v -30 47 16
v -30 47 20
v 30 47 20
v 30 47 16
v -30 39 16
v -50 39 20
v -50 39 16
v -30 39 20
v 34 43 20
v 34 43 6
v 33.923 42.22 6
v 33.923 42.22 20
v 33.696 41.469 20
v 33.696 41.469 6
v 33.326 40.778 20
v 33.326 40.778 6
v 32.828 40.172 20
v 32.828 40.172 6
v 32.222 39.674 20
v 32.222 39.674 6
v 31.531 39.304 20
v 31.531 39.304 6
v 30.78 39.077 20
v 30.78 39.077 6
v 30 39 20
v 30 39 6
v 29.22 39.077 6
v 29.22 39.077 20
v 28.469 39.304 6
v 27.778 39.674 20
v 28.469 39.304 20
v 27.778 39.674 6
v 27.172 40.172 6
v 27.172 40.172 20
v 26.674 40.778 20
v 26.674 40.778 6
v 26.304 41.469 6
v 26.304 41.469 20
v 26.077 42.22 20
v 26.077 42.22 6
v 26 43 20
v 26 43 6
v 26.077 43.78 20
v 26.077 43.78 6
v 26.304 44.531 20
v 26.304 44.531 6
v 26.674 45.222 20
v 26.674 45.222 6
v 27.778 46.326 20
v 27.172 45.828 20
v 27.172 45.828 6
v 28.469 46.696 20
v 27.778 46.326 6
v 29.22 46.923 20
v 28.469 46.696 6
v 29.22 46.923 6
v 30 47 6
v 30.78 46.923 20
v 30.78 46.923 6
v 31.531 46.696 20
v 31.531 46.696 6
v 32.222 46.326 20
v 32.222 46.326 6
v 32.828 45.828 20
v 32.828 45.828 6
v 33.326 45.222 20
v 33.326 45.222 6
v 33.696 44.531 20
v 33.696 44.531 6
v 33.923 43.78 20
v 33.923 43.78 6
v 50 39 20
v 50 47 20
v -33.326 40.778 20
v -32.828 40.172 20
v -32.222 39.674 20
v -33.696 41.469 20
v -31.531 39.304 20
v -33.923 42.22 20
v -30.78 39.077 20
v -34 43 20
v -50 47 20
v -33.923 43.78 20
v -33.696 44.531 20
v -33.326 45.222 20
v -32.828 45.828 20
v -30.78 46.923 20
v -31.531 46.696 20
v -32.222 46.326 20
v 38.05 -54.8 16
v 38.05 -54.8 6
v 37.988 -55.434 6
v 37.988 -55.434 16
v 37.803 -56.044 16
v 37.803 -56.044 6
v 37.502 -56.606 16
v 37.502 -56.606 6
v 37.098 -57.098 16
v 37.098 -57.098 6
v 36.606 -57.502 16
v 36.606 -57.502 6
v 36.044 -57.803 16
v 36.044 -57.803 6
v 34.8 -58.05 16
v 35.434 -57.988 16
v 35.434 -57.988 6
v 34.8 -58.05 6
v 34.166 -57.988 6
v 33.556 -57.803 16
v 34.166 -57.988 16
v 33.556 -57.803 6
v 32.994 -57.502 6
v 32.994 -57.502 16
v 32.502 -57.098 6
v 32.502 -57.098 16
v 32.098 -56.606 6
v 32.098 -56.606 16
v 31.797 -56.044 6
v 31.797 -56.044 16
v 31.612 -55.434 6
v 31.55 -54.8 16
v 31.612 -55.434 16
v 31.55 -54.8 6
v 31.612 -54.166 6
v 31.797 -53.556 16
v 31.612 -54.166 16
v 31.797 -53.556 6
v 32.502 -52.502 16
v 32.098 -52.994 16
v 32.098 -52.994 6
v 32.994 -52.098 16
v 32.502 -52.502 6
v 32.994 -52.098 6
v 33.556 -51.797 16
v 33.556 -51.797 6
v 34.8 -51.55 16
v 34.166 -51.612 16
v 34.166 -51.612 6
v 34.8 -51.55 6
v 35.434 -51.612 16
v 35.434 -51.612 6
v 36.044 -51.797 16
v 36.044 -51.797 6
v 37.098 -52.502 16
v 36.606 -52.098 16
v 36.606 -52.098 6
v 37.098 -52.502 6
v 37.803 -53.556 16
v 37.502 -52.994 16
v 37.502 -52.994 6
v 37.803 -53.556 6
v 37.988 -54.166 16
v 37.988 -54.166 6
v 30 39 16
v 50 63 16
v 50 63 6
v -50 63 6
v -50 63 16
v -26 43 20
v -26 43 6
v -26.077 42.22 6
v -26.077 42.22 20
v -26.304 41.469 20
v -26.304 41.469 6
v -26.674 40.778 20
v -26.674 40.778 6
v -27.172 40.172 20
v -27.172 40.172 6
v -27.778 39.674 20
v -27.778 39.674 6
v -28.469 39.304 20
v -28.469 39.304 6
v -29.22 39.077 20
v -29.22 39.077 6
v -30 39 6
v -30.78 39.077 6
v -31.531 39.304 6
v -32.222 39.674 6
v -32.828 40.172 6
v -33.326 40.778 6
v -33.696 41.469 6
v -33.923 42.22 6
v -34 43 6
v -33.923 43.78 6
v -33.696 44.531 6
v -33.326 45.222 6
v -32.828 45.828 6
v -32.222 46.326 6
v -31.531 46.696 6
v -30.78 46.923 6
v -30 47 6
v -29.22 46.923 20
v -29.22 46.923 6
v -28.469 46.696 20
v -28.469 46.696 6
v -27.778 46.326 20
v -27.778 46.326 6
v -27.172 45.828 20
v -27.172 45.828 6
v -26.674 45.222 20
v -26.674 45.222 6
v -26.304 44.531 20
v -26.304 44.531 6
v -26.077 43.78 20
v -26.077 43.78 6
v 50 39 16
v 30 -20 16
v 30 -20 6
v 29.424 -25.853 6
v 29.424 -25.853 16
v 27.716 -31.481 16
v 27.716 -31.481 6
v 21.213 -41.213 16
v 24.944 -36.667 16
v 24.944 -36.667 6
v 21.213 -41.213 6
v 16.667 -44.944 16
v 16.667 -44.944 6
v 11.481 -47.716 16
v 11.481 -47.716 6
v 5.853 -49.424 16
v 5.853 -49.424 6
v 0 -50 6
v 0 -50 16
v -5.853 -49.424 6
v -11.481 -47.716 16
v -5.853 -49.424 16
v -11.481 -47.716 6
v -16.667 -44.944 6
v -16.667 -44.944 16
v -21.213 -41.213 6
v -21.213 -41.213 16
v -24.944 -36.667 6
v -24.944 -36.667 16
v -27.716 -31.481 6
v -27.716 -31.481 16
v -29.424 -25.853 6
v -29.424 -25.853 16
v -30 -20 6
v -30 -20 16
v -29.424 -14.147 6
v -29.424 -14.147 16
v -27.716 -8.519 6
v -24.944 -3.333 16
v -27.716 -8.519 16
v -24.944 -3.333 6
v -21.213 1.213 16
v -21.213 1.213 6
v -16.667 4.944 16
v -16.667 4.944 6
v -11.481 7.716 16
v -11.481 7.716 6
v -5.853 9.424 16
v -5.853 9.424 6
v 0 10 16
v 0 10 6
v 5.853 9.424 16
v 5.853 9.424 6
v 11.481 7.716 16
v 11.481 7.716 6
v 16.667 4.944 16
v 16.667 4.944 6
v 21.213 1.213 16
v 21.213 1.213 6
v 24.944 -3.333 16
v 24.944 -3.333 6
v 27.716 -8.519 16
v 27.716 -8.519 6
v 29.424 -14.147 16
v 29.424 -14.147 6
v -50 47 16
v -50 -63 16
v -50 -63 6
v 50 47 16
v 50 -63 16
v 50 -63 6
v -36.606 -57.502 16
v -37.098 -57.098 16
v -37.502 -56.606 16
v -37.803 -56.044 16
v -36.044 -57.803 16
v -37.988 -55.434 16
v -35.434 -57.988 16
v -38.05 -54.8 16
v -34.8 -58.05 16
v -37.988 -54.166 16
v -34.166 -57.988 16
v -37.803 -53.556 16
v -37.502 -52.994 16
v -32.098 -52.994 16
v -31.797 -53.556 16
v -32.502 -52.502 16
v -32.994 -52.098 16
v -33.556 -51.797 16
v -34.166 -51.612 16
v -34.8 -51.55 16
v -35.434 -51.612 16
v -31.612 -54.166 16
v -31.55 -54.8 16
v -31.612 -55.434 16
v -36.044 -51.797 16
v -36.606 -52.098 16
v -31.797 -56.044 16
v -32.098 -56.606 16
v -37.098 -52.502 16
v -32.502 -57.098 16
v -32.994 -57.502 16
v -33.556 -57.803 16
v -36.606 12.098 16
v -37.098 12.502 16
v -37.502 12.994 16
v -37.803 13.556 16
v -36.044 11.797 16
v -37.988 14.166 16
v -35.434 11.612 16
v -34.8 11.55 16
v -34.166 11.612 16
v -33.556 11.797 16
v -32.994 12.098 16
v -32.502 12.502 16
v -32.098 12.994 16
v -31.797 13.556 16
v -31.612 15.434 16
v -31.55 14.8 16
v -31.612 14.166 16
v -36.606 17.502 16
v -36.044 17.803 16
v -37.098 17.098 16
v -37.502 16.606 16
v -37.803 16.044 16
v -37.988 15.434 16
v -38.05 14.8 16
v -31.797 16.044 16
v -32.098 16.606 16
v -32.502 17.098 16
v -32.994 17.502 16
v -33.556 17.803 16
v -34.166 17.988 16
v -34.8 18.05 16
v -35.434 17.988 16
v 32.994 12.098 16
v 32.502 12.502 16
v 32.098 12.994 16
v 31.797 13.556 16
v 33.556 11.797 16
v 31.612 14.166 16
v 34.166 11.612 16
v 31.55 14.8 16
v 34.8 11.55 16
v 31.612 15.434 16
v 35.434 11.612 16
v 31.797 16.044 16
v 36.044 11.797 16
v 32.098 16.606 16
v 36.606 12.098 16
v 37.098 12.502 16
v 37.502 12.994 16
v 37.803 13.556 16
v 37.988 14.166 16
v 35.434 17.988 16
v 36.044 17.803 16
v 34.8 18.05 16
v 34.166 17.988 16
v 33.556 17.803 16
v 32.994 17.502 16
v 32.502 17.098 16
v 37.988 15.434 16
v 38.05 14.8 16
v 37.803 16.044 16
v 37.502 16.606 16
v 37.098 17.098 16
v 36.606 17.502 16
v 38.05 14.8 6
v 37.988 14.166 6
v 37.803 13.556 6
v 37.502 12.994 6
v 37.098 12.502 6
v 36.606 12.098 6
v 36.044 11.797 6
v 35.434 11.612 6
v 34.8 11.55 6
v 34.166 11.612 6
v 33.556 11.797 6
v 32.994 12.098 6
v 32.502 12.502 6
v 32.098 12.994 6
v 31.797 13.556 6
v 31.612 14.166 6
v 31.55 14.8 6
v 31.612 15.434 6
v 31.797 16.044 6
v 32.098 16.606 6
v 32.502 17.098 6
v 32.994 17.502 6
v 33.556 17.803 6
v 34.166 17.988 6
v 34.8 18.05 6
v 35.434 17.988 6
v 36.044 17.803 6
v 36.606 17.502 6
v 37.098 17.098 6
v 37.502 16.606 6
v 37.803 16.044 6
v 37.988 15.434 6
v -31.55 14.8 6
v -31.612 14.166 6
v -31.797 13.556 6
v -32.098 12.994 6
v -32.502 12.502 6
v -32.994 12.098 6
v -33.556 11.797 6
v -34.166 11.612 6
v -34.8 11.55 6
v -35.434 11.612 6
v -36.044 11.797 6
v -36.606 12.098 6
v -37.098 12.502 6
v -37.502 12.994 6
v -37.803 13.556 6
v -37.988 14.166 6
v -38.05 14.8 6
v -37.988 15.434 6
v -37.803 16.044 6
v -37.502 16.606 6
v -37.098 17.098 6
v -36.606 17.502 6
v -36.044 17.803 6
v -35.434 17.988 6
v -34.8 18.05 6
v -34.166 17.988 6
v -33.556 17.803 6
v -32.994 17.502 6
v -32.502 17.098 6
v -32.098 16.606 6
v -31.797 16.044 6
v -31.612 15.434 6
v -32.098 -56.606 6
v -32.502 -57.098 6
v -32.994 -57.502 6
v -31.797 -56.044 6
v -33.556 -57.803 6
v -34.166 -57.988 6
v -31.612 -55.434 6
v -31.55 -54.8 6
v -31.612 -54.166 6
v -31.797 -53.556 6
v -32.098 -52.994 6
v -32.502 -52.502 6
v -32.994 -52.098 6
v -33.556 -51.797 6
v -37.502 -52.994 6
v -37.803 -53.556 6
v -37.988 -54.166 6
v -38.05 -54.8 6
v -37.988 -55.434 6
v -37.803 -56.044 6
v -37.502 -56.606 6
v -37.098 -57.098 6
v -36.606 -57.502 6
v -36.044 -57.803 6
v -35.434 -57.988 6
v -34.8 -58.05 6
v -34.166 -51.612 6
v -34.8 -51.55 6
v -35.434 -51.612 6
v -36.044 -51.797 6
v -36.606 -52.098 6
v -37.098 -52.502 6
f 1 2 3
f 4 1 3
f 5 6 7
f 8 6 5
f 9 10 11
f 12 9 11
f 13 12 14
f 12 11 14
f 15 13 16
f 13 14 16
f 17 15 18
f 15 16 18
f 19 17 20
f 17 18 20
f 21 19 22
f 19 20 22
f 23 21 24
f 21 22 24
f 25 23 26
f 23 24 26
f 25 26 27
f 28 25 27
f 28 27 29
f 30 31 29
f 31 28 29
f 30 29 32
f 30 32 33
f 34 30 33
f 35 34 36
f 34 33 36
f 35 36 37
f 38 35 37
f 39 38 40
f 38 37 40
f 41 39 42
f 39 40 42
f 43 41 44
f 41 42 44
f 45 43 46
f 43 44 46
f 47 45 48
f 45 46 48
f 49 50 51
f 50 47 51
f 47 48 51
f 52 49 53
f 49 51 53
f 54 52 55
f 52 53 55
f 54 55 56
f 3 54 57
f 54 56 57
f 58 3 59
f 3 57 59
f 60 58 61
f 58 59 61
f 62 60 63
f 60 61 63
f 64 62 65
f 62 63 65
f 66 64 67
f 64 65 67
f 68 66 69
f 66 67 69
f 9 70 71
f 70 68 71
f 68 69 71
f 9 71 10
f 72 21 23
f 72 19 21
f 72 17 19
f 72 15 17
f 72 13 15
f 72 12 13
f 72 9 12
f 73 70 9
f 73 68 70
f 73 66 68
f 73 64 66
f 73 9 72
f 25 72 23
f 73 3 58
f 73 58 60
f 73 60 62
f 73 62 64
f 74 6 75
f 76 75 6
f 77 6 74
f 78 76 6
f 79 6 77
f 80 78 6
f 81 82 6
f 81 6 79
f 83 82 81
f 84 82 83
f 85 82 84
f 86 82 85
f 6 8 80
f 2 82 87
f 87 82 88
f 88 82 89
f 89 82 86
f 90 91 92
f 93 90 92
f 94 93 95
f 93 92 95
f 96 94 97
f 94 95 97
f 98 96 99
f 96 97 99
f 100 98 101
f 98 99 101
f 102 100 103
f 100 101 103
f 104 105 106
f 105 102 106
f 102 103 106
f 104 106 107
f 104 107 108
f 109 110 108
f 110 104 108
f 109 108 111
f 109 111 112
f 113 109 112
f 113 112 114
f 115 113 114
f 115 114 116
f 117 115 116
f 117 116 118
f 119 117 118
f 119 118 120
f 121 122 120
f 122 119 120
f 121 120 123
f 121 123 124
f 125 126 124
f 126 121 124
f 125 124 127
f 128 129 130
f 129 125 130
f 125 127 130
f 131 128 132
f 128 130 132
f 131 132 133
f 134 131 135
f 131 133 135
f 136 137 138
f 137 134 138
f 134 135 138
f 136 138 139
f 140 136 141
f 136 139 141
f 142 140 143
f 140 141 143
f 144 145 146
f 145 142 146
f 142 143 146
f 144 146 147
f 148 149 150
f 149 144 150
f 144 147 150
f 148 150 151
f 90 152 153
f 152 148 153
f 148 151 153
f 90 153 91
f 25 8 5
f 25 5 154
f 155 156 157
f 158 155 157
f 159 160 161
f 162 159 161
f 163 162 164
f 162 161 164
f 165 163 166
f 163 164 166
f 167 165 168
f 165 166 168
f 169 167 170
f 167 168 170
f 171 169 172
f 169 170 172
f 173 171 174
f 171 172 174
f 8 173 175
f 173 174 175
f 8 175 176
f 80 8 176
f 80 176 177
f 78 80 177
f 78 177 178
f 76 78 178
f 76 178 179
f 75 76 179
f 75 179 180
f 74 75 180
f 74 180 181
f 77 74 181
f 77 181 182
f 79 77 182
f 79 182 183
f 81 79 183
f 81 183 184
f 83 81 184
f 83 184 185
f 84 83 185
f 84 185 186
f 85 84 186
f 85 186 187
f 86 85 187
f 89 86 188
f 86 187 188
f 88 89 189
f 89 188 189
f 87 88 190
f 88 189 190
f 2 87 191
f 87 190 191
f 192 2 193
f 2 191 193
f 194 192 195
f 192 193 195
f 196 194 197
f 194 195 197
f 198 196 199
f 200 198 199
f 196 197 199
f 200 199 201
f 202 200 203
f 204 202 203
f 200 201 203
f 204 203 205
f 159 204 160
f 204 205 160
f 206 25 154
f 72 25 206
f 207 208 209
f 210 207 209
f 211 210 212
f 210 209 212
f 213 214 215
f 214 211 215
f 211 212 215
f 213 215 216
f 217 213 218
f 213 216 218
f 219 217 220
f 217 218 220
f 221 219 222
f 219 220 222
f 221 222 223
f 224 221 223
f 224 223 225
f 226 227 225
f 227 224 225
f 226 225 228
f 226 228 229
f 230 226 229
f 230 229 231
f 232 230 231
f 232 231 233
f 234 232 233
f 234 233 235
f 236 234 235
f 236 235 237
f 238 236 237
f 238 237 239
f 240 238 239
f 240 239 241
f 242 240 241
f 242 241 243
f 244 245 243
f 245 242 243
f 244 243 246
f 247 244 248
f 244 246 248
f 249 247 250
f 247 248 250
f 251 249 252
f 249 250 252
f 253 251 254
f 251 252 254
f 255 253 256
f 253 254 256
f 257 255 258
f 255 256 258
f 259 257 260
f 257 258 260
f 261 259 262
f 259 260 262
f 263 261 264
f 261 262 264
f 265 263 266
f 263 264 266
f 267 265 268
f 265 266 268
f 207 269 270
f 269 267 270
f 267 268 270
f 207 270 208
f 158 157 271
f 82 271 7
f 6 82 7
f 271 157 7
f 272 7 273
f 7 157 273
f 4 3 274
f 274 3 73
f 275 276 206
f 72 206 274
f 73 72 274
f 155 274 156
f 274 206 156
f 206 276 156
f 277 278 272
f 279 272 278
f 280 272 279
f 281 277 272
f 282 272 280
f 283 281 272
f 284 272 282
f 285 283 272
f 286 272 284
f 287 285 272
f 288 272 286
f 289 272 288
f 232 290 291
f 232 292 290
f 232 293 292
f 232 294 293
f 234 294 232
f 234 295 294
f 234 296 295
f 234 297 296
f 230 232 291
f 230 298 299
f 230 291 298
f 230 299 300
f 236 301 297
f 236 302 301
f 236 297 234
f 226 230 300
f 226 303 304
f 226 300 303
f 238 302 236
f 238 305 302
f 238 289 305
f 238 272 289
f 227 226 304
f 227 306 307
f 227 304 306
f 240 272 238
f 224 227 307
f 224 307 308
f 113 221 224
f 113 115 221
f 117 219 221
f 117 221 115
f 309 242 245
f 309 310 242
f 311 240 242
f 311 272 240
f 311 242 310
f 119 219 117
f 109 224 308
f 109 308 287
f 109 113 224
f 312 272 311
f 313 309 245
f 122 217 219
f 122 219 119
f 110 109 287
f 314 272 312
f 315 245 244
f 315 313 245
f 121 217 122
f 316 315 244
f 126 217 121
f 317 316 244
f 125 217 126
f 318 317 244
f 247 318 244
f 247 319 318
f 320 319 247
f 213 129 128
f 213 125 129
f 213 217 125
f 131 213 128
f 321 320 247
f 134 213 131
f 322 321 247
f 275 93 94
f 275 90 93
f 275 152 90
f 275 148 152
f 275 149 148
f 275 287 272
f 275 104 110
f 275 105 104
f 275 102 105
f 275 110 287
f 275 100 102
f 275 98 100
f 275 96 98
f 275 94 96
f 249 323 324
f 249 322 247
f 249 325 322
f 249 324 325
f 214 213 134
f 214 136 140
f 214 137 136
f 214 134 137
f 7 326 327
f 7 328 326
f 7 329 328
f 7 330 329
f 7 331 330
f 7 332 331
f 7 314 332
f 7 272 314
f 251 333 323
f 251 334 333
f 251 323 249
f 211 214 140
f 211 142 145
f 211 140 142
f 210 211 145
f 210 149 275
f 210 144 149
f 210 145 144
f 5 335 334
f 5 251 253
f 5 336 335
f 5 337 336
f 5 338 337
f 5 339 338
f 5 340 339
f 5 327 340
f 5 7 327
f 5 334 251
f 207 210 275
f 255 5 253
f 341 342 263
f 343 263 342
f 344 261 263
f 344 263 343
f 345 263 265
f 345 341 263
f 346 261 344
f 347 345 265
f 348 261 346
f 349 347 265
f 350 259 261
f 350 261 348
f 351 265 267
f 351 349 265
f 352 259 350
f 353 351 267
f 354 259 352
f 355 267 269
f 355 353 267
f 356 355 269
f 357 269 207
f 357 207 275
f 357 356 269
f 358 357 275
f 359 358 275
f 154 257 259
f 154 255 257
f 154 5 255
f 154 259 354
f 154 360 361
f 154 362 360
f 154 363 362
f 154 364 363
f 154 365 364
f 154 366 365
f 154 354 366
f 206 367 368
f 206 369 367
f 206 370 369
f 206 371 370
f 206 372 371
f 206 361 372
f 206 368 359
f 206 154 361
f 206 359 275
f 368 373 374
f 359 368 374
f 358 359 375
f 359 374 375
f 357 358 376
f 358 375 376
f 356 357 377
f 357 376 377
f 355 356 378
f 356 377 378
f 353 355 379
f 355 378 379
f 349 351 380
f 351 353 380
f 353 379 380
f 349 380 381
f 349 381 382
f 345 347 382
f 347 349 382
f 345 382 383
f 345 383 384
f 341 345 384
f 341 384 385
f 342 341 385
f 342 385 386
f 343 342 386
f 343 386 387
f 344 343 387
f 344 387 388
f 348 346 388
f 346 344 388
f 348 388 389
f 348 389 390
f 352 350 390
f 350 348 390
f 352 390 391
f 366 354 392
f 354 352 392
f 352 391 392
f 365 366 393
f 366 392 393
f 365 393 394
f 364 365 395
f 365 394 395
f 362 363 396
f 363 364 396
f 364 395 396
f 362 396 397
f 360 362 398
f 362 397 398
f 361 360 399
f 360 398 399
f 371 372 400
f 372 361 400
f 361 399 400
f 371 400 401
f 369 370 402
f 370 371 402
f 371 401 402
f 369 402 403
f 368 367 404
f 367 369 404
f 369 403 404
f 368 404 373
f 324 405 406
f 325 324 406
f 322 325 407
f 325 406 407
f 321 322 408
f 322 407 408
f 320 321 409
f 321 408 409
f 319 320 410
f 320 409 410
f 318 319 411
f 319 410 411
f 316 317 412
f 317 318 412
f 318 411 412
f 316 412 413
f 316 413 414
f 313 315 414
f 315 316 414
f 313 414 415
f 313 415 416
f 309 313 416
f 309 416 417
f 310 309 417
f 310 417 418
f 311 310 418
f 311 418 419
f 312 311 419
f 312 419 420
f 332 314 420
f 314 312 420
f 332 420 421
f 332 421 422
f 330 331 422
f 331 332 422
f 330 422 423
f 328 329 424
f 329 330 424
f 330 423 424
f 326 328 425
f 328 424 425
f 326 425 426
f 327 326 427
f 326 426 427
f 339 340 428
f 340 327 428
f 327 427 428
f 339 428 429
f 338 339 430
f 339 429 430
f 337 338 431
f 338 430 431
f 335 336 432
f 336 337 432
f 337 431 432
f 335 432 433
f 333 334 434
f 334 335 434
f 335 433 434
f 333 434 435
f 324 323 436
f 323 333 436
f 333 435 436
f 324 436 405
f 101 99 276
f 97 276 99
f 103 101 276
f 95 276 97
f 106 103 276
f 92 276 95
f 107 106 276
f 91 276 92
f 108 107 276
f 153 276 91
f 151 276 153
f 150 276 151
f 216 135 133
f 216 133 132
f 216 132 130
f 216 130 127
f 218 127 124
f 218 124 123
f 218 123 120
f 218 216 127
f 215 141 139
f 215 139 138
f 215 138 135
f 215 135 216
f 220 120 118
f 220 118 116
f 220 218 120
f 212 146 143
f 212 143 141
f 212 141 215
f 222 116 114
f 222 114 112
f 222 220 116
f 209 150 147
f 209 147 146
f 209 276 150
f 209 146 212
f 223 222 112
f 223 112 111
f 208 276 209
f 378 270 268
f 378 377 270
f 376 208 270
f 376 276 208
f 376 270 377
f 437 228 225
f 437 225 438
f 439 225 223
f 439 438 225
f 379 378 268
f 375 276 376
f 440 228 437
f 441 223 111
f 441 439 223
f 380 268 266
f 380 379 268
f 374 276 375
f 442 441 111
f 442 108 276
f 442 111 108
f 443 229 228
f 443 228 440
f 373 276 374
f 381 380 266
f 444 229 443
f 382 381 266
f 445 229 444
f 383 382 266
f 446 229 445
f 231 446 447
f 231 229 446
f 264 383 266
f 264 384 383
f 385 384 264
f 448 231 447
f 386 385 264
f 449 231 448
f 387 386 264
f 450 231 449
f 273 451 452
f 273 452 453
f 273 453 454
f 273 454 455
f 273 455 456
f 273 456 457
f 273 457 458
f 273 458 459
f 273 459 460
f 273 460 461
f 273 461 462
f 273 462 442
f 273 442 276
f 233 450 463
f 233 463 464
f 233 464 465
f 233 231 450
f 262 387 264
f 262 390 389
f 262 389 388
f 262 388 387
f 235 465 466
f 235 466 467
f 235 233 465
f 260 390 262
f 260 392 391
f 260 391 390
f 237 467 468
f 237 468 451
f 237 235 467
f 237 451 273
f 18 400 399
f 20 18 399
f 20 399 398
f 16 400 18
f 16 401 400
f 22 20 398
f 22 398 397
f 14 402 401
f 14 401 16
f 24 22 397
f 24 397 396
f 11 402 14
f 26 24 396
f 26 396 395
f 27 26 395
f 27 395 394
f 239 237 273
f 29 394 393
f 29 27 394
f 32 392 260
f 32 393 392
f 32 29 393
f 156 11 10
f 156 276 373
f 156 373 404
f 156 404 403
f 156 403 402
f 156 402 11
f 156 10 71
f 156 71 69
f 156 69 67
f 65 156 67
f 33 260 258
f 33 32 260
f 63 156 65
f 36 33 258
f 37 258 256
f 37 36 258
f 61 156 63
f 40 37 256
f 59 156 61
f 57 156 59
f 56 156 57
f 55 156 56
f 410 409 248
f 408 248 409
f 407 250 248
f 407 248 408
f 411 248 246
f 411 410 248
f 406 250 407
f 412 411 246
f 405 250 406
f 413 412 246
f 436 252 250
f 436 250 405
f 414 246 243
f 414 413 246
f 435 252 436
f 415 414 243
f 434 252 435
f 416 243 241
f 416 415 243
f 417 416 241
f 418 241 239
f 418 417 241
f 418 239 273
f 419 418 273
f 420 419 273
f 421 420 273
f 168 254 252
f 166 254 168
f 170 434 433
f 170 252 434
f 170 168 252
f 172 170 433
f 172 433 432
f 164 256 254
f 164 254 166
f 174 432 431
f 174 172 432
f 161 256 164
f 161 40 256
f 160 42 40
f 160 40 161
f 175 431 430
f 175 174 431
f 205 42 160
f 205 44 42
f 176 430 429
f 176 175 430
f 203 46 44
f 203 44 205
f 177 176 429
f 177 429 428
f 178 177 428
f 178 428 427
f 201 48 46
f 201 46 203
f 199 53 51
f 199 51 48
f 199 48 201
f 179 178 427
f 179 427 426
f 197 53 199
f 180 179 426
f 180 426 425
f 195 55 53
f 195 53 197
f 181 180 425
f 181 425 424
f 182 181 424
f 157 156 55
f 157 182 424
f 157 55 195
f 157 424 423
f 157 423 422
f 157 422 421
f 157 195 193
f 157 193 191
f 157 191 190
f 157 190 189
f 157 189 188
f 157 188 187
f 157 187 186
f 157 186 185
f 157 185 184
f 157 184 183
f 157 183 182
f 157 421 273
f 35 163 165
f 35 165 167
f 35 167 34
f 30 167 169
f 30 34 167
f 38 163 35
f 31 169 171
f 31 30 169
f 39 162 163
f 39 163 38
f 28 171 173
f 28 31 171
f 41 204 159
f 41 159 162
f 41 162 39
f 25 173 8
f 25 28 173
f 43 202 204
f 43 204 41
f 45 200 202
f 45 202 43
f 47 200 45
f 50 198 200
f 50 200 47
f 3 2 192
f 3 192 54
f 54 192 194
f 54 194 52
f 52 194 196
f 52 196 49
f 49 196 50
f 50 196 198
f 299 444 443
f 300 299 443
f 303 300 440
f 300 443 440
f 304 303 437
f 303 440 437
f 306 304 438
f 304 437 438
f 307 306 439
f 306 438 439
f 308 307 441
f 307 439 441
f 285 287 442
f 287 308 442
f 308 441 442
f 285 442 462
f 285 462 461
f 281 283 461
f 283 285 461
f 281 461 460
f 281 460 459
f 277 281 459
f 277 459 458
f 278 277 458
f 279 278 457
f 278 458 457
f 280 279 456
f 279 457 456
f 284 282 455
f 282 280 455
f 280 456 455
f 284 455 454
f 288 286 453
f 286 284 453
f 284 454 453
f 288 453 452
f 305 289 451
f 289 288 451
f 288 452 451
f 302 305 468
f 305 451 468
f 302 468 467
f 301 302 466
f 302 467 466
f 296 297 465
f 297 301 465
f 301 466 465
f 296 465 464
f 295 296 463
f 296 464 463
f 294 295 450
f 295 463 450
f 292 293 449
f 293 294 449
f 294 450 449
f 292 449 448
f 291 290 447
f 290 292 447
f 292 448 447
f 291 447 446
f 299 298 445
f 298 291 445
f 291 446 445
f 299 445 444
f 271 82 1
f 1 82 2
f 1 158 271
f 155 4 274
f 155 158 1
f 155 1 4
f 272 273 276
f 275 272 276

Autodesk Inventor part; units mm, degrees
ref_plane "YZ Plane" through (0, 0, 0) normal (1, 0, 0) x (0, 1, 0)
ref_plane "XZ Plane" through (0, 0, 0) normal (0, 1, 0) x (-1, 0, 0)
ref_plane "XY Plane" through (0, 0, 0) normal (0, 0, 1) x (1, 0, 0)
sketch "Sketch1" plane through (0, 0, 0) normal (0, 0, 1) x (1, 0, 0)
  line L0 (0, 88.2) -> (0, -88.2) projected
  line L1 (-70, 0) -> (70, 0) projected
  line L2 (-50, -63) -> (50, -63)
  line L3 (50, -63) -> (50, 63)
  line L4 (50, 63) -> (-50, 63)
  line L5 (-50, 63) -> (-50, -63)
  circle A0 centre (0, -20) radius 30
  circle A1 centre (-30, 43) radius 4
  circle A2 centre (30, 43) radius 4
  circle A3 centre (34.8, -54.8) radius 3.25
  circle A4 centre (34.8, 14.8) radius 3.25
  circle A5 centre (-34.8, 14.8) radius 3.25
  circle A6 centre (-34.8, -54.8) radius 3.25
  line L6 (-30, 43) -> (-30, 39)
  line L7 (0, -20) -> (0, 10)
  point P0 (0, 0)
  dimension "d2" = 60
  dimension "d4" = 8
  dimension "d0" = 100
  dimension "d1" = 126
  dimension "d3" = 43
  dimension "d5" = 8
  dimension "d6" = 20
  dimension "d7" = 20
  dimension "d8" = 20
  dimension "d9" = 20
  dimension "d10" = 6.5
  dimension "d11" = 6.5
  dimension "d12" = 6.5
  dimension "d13" = 6.5
  dimension "d14" = 69.6
  dimension "d15" = 69.6
  dimension "d16" = 69.6
  dimension "d17" = 69.6
  dimension "d18" = 0
  dimension "d19" = 0
  dimension "d20" = 34.8
  dimension "d21" = 34.8
  dimension "d22" = 29
extrude "Extrusion1" add sketch "Sketch1" along normal blind 20 contours L4 L3 L1 A0 L0 | L0 A0 L1 L5 L4 | L1 L3 L2 L0 A0 | A0 L0 L2 L5 L1
sketch "Sketch2" plane through (0, 0, 20) normal (0, 0, 1) x (1, 0, 0)
  line L0 (50, 63) -> (-50, 63) projected
  line L1 (-50, 63) -> (-50, -63) projected
  line L2 (-50, -63) -> (50, -63) projected
  line L3 (50, -63) -> (50, 63) projected
  circle A0 centre (30, 43) radius 4 projected
  circle A1 centre (34.8, 14.8) radius 3.25 projected
  circle A2 centre (34.8, -54.8) radius 3.25 projected
  circle A3 centre (-34.8, -54.8) radius 3.25 projected
  circle A4 centre (-34.8, 14.8) radius 3.25 projected
  circle A5 centre (-30, 43) radius 4 projected
  circle A6 centre (0, -20) radius 30 projected
  line L4 (-50, 63) -> (-50, -63) projected
  line L5 (-50, 43) -> (50, 43)
  line L6 (-50, 47) -> (50, 47)
  line L7 (-50, 39) -> (50, 39)
  point P0 (0, 0)
  dimension "d25" = 4
  dimension "d26" = 4
extrude "Extrusion2" cut sketch "Sketch2" against normal blind 4 contours L3 L6 L1 L0 | L3 L2 L1 L7
sketch "Sketch3" plane through (0, 0, 0) normal (0, 0, -1) x (-1, 0, 0)
  line L0 (-50, 63) -> (50, 63) projected
  line L1 (-50, -63) -> (-50, 63) projected
  line L2 (50, -63) -> (-50, -63) projected
  line L3 (50, 63) -> (50, -63) projected
  circle A0 centre (-30, 43) radius 4 projected
  circle A1 centre (-34.8, 14.8) radius 3.25 projected
  circle A2 centre (-34.8, -54.8) radius 3.25 projected
  circle A3 centre (34.8, -54.8) radius 3.25 projected
  circle A4 centre (34.8, 14.8) radius 3.25 projected
  circle A5 centre (30, 43) radius 4 projected
  circle A6 centre (0, -20) radius 30 projected
  point P0 (0, 0)
extrude "Extrusion3" cut sketch "Sketch3" against normal blind 6
properties part number "motor mount lower"
